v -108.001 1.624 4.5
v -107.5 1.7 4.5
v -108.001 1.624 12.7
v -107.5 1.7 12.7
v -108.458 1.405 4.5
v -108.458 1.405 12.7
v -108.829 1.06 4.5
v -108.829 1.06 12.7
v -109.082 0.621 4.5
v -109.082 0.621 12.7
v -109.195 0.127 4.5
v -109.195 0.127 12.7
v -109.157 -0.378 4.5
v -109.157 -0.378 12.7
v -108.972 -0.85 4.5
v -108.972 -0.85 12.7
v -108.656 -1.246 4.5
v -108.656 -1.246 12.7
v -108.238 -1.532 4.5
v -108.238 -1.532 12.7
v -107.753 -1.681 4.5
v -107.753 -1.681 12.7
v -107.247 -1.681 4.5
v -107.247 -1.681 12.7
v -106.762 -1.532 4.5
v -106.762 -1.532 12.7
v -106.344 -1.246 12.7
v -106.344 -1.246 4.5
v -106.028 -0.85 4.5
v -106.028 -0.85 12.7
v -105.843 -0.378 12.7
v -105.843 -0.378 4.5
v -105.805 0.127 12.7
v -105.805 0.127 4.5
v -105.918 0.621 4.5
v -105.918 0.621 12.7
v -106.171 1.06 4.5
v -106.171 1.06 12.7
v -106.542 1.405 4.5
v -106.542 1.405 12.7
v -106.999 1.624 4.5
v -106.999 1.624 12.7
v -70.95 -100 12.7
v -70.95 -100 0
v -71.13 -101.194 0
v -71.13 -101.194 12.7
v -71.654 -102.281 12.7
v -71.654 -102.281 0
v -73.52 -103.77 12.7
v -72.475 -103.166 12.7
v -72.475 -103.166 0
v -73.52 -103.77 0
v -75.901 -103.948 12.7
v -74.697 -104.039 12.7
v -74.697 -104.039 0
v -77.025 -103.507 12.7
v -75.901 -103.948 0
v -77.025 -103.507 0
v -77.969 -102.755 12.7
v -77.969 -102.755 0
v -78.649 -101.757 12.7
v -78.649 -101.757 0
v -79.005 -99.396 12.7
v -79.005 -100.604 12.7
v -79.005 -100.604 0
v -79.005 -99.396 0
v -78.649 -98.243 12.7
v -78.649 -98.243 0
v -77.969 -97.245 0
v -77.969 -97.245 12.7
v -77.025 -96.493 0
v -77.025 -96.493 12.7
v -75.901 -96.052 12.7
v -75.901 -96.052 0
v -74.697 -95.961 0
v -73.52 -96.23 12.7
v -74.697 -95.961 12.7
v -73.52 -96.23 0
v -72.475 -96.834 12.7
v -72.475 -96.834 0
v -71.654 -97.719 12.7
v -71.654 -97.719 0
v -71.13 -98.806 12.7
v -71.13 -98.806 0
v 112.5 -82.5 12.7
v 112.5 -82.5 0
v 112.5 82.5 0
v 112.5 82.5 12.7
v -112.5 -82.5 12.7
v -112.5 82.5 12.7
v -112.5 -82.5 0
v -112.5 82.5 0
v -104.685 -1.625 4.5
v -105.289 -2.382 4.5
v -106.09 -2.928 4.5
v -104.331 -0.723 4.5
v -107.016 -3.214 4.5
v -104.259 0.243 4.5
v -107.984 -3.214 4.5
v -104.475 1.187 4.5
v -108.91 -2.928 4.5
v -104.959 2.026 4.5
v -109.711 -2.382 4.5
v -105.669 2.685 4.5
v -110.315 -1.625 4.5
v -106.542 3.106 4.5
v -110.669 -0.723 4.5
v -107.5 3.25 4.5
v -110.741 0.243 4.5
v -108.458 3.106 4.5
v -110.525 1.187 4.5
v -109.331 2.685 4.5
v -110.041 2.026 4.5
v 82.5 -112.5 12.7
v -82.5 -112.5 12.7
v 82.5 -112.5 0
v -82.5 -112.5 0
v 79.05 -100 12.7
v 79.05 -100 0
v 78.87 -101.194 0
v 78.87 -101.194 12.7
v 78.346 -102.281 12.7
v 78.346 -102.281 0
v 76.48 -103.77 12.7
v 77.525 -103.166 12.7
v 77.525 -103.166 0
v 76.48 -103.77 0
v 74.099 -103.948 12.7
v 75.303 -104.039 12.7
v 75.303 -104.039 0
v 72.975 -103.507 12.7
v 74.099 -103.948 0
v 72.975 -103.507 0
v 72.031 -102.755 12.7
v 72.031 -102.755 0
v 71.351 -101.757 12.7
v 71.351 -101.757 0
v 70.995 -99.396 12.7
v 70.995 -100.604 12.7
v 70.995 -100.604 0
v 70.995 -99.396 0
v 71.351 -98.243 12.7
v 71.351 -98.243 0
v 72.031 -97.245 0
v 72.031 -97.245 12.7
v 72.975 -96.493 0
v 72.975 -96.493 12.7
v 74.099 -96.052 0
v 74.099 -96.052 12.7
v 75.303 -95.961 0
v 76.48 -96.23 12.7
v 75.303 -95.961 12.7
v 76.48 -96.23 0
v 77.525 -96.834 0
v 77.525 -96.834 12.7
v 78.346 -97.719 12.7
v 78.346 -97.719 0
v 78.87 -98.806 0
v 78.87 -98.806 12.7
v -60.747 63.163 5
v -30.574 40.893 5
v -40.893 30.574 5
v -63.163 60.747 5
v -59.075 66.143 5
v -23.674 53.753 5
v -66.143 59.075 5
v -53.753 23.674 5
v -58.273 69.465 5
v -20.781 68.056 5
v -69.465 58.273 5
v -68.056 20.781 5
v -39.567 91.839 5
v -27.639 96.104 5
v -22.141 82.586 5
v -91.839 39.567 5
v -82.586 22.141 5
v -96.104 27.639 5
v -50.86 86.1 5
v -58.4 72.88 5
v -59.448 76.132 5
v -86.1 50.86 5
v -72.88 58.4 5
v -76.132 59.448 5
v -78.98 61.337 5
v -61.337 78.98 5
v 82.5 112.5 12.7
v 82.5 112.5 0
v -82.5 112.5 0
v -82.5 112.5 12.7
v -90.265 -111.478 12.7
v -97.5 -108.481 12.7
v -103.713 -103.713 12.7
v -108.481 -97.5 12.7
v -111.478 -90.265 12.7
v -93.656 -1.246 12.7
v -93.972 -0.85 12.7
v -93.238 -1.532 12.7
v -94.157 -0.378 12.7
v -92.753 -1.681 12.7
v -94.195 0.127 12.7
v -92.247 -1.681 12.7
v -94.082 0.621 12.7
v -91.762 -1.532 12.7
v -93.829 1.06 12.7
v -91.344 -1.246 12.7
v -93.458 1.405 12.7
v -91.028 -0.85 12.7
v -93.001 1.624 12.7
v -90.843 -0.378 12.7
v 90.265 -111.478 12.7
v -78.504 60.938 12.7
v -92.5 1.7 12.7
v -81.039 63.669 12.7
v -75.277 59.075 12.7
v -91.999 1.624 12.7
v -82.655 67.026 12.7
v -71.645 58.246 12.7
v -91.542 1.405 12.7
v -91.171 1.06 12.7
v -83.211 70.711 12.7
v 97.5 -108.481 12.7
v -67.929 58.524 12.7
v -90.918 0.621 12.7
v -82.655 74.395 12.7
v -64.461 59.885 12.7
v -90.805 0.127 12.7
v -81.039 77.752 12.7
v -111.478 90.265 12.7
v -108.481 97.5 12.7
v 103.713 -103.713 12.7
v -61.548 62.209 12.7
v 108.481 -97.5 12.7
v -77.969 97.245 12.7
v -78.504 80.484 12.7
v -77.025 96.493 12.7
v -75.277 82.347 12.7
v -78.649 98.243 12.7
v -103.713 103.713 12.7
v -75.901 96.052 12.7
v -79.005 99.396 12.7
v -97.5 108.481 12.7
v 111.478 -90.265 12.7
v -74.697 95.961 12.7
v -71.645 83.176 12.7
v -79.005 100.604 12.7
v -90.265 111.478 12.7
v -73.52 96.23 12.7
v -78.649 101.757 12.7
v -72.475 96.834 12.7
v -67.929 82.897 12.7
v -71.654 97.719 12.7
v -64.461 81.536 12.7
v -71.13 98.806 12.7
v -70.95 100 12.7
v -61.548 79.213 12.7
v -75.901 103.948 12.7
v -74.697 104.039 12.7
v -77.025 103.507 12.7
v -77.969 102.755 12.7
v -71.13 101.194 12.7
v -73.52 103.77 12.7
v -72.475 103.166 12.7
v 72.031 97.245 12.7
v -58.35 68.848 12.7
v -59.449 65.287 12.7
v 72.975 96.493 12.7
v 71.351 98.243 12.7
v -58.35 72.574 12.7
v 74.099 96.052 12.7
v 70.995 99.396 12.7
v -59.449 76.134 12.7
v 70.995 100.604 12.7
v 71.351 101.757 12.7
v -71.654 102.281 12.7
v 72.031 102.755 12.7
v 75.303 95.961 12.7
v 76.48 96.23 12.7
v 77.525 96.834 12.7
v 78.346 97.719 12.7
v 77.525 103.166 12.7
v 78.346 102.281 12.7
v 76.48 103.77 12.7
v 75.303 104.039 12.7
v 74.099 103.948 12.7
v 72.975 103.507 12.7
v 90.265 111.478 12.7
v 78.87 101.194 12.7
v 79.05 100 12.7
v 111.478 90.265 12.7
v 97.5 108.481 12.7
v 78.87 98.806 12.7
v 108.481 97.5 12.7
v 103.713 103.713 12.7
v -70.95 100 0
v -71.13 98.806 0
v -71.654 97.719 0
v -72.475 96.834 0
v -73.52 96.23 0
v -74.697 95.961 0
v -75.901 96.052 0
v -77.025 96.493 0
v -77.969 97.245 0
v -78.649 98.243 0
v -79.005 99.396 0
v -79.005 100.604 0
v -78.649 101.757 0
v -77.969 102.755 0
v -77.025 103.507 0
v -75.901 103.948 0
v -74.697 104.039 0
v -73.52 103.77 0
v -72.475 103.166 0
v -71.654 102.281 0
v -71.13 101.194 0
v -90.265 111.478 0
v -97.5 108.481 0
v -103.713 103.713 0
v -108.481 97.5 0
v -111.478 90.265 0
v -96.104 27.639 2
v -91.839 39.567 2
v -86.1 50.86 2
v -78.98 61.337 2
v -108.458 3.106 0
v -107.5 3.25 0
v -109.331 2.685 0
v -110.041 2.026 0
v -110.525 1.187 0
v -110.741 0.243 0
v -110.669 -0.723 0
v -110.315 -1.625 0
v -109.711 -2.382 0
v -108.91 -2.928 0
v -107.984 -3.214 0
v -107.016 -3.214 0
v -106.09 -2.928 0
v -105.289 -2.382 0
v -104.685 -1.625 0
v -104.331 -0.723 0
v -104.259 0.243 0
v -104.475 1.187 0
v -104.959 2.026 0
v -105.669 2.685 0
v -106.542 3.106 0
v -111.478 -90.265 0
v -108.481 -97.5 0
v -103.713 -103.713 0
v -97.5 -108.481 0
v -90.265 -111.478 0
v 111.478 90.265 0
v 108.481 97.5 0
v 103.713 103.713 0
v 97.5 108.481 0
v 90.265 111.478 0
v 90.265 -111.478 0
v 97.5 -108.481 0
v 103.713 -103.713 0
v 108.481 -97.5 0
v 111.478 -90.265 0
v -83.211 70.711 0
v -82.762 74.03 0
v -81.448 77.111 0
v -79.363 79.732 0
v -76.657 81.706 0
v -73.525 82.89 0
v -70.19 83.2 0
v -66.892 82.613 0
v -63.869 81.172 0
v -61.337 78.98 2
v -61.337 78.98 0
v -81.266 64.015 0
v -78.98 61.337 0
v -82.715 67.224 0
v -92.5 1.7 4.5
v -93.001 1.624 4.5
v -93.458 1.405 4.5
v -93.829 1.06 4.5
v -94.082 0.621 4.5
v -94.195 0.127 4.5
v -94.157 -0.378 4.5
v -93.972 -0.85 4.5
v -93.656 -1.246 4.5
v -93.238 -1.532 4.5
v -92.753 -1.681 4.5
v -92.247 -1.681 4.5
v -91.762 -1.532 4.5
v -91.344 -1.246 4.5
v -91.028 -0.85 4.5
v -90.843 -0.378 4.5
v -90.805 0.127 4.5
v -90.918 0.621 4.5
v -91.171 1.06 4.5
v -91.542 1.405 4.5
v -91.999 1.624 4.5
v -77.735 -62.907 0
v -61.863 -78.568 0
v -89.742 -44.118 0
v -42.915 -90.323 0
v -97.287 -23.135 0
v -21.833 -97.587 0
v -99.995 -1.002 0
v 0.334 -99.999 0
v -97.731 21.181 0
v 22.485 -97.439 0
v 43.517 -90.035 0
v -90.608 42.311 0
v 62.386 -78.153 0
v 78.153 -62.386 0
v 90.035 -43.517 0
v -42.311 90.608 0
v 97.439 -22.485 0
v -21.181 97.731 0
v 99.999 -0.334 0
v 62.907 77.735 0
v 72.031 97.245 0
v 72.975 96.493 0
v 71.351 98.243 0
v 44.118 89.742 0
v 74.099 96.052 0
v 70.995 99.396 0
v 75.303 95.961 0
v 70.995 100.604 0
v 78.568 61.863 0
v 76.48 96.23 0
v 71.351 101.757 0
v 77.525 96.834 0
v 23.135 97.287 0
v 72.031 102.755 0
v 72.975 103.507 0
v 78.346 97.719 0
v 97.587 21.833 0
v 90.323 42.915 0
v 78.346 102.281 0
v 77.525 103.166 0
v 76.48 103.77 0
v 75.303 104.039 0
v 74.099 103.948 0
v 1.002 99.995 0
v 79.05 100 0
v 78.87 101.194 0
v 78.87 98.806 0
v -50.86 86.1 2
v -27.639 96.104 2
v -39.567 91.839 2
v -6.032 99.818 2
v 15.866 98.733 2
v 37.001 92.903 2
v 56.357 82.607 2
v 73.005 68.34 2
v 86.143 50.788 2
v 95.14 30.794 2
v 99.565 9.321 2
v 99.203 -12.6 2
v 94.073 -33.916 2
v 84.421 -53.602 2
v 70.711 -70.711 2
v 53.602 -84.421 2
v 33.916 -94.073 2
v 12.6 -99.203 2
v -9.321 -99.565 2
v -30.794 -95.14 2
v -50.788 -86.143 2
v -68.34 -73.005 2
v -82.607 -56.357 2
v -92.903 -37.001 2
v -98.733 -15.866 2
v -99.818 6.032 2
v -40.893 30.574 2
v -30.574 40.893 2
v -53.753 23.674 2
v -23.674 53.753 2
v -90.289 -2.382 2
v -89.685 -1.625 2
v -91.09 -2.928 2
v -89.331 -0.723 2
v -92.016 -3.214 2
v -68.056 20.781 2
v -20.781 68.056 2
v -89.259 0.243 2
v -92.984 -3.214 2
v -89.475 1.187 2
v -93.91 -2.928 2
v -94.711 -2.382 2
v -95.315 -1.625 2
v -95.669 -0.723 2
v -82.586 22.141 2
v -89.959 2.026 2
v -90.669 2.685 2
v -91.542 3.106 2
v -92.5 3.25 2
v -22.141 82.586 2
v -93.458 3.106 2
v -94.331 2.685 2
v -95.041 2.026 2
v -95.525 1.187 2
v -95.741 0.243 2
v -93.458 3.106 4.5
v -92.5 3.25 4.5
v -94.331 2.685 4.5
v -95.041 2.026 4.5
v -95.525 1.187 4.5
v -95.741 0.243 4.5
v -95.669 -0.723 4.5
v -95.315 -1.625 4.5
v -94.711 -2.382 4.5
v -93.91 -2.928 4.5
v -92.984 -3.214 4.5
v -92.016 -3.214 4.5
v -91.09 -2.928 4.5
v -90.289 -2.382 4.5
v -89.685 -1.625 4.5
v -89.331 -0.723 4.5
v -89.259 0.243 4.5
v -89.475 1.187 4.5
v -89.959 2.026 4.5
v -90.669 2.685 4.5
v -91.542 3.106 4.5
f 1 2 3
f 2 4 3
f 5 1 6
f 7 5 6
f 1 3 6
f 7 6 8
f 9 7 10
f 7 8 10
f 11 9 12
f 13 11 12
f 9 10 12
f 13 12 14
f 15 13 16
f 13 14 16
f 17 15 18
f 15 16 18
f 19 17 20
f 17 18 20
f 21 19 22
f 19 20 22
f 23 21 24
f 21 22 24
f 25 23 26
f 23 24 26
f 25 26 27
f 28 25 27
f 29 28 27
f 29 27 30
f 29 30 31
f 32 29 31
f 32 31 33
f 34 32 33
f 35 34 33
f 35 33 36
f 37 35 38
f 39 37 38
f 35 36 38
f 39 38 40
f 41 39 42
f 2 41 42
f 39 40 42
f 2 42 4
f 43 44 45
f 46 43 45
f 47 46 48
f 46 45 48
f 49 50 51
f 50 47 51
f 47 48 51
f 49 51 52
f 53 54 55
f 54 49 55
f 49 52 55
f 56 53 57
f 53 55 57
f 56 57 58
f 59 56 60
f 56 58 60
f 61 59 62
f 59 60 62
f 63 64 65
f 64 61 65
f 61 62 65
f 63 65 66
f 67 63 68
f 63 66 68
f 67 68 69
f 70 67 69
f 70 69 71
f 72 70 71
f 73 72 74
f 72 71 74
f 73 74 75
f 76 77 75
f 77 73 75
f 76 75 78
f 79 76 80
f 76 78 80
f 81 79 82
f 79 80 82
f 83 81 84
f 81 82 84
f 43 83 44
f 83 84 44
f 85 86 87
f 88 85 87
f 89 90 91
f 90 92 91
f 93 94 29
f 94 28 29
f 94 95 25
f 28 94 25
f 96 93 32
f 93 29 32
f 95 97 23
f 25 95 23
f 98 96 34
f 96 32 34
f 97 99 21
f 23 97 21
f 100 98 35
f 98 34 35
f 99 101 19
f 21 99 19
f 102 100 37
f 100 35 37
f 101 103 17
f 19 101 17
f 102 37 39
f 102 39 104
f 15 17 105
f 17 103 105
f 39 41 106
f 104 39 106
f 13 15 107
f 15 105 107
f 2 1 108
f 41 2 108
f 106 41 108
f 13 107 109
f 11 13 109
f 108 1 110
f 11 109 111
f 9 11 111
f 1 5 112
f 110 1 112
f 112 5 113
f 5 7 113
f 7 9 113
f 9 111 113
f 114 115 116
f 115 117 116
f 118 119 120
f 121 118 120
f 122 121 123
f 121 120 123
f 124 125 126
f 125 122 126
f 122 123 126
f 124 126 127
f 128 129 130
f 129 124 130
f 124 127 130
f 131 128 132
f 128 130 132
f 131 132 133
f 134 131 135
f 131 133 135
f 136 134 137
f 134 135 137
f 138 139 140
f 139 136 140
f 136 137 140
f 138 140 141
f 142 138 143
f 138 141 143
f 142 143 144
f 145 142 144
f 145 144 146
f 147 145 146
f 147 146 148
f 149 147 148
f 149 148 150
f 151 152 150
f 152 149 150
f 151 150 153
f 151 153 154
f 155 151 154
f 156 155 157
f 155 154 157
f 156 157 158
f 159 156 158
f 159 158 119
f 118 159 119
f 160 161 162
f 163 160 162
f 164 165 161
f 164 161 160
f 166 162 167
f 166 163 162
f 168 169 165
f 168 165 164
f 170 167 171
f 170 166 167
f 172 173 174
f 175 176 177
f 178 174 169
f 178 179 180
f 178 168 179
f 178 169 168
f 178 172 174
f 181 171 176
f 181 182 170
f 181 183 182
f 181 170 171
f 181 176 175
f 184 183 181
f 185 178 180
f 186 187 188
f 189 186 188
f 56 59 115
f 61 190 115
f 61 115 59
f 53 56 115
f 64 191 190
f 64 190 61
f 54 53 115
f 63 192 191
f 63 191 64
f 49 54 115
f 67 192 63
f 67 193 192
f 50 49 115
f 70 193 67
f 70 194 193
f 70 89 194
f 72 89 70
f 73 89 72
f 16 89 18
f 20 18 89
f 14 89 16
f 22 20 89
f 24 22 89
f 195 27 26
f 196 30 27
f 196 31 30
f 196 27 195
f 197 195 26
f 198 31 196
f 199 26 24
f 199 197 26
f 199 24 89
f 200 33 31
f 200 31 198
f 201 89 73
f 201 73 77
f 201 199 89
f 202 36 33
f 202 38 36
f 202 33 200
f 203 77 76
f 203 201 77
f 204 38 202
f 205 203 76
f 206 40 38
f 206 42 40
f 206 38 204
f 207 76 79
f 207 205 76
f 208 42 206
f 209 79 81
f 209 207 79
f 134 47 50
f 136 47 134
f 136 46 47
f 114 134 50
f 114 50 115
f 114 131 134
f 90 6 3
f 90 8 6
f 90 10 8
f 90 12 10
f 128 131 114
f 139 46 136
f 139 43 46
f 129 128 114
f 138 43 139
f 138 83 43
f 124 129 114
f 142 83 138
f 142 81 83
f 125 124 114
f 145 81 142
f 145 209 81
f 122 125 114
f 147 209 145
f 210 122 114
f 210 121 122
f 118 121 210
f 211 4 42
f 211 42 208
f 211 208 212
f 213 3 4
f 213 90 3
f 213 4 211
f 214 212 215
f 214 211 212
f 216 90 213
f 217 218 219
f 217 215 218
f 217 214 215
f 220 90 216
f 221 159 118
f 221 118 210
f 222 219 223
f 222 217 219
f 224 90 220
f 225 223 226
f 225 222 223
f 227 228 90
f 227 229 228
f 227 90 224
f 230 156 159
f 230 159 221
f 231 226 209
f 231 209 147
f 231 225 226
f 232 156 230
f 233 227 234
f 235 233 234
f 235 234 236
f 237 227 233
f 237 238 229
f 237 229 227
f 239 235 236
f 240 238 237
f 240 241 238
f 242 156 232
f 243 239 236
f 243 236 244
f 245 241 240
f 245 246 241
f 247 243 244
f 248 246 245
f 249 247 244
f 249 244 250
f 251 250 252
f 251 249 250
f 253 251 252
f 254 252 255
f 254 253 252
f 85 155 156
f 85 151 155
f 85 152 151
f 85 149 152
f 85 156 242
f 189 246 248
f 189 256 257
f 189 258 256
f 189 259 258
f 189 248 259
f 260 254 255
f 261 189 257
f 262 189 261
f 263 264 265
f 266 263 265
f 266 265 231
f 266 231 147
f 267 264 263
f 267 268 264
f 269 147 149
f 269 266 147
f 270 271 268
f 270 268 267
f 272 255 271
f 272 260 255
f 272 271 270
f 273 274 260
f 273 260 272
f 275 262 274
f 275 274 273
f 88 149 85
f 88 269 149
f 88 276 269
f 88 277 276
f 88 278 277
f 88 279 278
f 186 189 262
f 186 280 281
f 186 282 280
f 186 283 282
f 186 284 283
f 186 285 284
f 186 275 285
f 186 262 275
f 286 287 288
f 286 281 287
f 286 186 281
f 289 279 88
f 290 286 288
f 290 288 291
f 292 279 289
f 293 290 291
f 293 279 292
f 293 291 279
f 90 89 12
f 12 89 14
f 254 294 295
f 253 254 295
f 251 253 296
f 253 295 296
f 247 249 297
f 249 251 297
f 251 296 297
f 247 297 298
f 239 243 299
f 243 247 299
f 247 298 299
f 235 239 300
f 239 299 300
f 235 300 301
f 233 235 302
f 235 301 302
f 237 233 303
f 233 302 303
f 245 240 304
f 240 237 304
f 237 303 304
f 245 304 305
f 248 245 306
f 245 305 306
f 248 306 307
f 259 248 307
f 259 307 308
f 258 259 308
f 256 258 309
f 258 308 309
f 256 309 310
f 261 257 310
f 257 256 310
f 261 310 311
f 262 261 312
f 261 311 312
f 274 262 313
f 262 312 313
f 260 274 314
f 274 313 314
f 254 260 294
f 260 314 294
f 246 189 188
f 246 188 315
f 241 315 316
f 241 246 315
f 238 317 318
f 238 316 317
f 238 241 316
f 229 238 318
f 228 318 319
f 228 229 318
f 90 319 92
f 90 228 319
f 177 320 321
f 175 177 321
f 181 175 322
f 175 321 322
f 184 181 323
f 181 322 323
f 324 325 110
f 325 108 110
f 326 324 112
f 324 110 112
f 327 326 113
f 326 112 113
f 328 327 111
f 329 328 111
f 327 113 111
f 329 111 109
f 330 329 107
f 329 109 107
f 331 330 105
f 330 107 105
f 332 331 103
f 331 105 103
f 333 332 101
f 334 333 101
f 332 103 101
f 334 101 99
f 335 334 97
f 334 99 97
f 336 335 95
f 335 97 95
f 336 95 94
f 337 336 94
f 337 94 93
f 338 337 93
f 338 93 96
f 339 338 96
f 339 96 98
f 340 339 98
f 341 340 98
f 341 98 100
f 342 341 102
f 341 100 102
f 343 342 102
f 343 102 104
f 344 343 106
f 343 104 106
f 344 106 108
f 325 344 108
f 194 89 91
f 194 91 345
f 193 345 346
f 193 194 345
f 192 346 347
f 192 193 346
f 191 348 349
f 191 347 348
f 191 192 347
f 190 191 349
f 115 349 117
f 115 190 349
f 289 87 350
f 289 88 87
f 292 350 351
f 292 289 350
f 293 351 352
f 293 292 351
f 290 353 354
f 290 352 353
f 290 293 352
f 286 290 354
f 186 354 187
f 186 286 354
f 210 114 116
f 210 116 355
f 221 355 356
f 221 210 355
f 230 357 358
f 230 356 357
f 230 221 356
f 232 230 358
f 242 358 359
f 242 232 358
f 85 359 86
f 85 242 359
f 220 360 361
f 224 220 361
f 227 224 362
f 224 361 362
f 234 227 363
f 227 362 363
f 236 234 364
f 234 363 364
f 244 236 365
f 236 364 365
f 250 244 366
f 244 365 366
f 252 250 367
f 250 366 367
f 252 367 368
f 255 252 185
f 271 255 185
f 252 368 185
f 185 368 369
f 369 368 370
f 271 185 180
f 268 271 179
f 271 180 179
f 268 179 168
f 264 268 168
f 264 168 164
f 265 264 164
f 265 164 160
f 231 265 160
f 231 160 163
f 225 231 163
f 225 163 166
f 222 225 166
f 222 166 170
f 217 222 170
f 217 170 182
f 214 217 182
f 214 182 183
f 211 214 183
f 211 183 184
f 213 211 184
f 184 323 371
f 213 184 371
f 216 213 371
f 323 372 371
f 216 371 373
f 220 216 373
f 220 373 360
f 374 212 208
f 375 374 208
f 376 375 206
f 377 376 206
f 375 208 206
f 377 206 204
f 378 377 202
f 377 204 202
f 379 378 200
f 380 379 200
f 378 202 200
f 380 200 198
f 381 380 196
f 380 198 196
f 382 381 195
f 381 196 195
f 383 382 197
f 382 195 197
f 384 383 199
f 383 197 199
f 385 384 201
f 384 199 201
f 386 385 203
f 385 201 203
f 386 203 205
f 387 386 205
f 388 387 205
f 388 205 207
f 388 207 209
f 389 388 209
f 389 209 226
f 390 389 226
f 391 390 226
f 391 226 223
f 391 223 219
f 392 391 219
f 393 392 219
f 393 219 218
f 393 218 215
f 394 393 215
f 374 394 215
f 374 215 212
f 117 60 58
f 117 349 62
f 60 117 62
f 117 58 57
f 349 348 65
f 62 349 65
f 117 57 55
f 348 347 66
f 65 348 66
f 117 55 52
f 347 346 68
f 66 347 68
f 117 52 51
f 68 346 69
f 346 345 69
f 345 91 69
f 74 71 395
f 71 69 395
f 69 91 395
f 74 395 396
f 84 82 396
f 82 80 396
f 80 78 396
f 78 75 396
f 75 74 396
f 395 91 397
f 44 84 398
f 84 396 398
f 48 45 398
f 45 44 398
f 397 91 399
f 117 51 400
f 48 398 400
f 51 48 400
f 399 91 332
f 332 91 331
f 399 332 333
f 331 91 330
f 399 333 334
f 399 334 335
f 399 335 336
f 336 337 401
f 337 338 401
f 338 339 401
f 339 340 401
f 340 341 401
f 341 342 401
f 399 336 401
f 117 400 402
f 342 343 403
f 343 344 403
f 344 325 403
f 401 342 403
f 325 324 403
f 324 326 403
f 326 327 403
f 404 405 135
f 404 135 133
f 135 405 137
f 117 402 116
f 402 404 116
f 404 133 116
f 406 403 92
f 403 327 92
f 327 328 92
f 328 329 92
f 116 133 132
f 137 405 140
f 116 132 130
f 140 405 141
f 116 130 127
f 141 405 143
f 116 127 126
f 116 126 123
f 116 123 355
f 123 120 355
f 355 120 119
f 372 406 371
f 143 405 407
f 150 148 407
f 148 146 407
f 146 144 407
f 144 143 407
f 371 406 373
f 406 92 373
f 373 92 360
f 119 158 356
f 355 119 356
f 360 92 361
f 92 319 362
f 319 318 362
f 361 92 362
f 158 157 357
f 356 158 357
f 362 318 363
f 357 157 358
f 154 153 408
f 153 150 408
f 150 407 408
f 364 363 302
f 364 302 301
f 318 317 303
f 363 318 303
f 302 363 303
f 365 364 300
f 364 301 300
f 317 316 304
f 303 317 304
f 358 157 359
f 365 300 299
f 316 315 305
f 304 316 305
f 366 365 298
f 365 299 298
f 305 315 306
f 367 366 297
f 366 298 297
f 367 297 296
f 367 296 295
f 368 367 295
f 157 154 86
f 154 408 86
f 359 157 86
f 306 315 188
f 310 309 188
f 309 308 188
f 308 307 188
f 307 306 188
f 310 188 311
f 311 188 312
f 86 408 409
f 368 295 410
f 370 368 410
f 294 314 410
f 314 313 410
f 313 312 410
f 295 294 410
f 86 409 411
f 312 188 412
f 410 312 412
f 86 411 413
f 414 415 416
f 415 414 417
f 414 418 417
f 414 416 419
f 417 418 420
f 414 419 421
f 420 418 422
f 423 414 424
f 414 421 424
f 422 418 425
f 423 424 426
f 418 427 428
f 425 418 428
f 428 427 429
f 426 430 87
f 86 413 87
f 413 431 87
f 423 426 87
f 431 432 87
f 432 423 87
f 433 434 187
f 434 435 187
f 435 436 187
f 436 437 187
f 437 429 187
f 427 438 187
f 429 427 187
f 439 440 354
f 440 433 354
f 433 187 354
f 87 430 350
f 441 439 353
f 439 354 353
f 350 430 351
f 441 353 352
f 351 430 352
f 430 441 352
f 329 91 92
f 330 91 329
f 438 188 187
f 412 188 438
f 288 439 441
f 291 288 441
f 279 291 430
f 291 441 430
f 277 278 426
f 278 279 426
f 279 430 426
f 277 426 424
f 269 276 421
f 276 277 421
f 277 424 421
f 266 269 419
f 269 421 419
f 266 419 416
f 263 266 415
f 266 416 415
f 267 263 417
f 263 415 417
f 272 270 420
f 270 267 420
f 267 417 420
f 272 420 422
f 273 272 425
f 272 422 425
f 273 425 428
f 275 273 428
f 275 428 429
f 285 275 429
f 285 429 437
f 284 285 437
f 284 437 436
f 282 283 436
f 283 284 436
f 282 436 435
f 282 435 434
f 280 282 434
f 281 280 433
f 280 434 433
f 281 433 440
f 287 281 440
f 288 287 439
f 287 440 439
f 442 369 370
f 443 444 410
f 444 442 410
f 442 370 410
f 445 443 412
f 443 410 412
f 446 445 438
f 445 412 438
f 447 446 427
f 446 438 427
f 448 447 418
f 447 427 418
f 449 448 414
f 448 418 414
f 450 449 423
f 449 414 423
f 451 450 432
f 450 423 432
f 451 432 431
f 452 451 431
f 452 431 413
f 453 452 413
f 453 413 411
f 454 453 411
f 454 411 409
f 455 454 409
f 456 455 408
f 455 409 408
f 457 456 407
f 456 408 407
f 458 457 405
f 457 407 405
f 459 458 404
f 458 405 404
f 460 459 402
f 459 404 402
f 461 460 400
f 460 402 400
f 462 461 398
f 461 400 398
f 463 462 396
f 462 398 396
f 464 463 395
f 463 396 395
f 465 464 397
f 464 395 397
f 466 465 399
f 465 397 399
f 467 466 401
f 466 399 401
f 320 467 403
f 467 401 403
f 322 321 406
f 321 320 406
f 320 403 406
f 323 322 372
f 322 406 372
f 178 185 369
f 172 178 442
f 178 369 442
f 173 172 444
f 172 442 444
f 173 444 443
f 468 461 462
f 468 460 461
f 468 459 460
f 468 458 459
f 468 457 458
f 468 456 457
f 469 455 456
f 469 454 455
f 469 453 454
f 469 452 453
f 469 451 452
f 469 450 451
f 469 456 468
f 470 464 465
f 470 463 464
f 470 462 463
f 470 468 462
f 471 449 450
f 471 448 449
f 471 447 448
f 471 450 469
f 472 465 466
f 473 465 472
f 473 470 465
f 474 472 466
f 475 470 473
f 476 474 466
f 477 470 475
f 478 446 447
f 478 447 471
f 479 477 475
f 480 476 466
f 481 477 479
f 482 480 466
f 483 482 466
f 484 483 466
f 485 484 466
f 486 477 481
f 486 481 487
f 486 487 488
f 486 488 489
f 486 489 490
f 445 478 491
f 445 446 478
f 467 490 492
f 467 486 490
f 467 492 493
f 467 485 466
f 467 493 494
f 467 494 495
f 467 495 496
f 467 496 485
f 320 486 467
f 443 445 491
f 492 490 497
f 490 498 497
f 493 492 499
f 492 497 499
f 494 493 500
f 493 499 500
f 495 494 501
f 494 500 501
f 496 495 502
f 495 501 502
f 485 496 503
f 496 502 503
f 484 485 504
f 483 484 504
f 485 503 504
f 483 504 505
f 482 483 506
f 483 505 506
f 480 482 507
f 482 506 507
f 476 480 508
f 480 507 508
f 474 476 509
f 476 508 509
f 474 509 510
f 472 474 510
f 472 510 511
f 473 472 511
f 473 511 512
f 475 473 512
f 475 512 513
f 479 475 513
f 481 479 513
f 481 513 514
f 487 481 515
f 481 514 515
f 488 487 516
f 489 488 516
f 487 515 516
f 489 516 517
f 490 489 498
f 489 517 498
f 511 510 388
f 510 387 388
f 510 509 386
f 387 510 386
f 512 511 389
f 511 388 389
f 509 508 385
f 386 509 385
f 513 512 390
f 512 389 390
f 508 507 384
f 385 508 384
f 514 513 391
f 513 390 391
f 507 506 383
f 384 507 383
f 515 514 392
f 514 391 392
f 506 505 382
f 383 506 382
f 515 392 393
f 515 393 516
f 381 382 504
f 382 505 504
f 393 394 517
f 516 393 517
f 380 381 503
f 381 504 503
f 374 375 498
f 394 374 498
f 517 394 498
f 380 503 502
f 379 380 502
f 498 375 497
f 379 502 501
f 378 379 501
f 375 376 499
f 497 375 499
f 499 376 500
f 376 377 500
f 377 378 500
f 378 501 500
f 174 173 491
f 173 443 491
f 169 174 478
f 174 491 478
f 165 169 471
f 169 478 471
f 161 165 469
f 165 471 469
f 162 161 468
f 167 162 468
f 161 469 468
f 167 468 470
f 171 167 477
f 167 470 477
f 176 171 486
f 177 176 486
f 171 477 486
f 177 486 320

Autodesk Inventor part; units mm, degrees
ref_plane "YZ Plane" through (0, 0, 0) normal (1, 0, 0) x (0, 1, 0)
ref_plane "XZ Plane" through (0, 0, 0) normal (0, 1, 0) x (-1, 0, 0)
ref_plane "XY Plane" through (0, 0, 0) normal (0, 0, 1) x (1, 0, 0)
sketch "Sketch1" plane through (0, 0, 0) normal (0, 0, 1) x (1, 0, 0)
  circle A0 centre (0, 0) radius 100 construction
  line L0 (112.5, 0) -> (112.5, 112.5)
  line L1 (112.5, 112.5) -> (-112.5, 112.5)
  line L2 (-112.5, 112.5) -> (-112.5, -112.5)
  line L3 (-112.5, -112.5) -> (112.5, -112.5)
  line L4 (112.5, -112.5) -> (112.5, 0)
  circle A1 centre (-75, -100) radius 4.05
  circle A2 centre (75, -100) radius 4.05
  line L5 (75, -100) -> (-75, -100) construction
  line L6 (-75, -100) -> (-75, 100) construction
  line L7 (-75, 100) -> (75, 100) construction
  line L8 (75, 100) -> (75, -100) construction
  circle A3 centre (-75, 100) radius 4.05
  circle A4 centre (75, 100) radius 4.05
  point P0 (0, 112.5)
  point P1 (75, 0)
  dimension "d0" = 200
  dimension "d2" = 225
  dimension "d3" = 225
  dimension "d4" = 150
  dimension "d5" = 37.5
  dimension "d6" = 12.5
  dimension "d7" = 8.1
extrude "Extrusion1" add sketch "Sketch1" along normal blind 12.7
fillet "Fillet1" radius 30 4 edges at (-112.5, -112.5, 6.35) (-112.5, 112.5, 6.35) (112.5, -112.5, 6.35) (112.5, 112.5, 6.35)
sketch "Sketch2" plane through (0, 0, 0) normal (0, 0, -1) x (-1, 0, 0)
  circle A0 centre (0, 0) radius 100
  dimension "d14" = 200
extrude "Extrusion2" cut sketch "Sketch2" against normal blind 2
sketch "Sketch4" plane through (0, 0, 0) normal (0, 0, -1) x (-1, 0, 0)
  circle A0 centre (92.5, 0) radius 1.55
  circle A1 centre (107.5, 0) radius 1.55
  circle A2 centre (0, 0) radius 100 projected
  line L0 (112.5, 82.5) -> (112.5, -82.5) projected
  dimension "d44" = 15
  dimension "d45" = 0
  dimension "d46" = 5
  dimension "d47" = 3.1
hole "Hole1" at (-92.5, 0, 0) at (-107.5, 0, 0) direction (0, 0, 1) diameter 3.4 end through all counterbore diameter 6.5 counterbore depth 4.5 clearance for "Socket Head Cap Screw" size "M3" standard "Ansi Metric M Profile"
sketch "Sketch5" plane through (0, 0, 2) normal (0, 0, -1) x (-1, 0, 0)
  circle A0 centre (0, 0) radius 100 projected
  circle A1 centre (70.7107, 70.7107) radius 12.5
  line L0 (0, 0) -> (70.7107, 70.7107) construction
  line L1 (82.5, -112.5) -> (-82.5, -112.5) construction
  dimension "d32" = 25
  dimension "d35" = 45
extrude "Extrusion4" cut sketch "Sketch5" along normal through all both and the other way through all contours A1 A0 | A0 A1 picked at (68.0843, 67.4022) picked at (73.7867, 73.4347)
sketch "Sketch6" plane through (0, 0, 2) normal (0, 0, -1) x (-1, 0, 0)
  arc A0 (61.3367, 78.9798) -> (78.9798, 61.3367) centre (70.7107, 70.7107) ccw projected
  arc A1 (61.3367, 78.9798) -> (78.9798, 61.3367) centre (0, 0) ccw projected
  arc A2 (27.6392, 96.1045) -> (96.1045, 27.6392) centre (70.7107, 70.7107) ccw
  dimension "d39" = 50
extrude "Extrusion5" cut sketch "Sketch6" against normal blind 3 contours A0 A1 A2
properties part number "board"
